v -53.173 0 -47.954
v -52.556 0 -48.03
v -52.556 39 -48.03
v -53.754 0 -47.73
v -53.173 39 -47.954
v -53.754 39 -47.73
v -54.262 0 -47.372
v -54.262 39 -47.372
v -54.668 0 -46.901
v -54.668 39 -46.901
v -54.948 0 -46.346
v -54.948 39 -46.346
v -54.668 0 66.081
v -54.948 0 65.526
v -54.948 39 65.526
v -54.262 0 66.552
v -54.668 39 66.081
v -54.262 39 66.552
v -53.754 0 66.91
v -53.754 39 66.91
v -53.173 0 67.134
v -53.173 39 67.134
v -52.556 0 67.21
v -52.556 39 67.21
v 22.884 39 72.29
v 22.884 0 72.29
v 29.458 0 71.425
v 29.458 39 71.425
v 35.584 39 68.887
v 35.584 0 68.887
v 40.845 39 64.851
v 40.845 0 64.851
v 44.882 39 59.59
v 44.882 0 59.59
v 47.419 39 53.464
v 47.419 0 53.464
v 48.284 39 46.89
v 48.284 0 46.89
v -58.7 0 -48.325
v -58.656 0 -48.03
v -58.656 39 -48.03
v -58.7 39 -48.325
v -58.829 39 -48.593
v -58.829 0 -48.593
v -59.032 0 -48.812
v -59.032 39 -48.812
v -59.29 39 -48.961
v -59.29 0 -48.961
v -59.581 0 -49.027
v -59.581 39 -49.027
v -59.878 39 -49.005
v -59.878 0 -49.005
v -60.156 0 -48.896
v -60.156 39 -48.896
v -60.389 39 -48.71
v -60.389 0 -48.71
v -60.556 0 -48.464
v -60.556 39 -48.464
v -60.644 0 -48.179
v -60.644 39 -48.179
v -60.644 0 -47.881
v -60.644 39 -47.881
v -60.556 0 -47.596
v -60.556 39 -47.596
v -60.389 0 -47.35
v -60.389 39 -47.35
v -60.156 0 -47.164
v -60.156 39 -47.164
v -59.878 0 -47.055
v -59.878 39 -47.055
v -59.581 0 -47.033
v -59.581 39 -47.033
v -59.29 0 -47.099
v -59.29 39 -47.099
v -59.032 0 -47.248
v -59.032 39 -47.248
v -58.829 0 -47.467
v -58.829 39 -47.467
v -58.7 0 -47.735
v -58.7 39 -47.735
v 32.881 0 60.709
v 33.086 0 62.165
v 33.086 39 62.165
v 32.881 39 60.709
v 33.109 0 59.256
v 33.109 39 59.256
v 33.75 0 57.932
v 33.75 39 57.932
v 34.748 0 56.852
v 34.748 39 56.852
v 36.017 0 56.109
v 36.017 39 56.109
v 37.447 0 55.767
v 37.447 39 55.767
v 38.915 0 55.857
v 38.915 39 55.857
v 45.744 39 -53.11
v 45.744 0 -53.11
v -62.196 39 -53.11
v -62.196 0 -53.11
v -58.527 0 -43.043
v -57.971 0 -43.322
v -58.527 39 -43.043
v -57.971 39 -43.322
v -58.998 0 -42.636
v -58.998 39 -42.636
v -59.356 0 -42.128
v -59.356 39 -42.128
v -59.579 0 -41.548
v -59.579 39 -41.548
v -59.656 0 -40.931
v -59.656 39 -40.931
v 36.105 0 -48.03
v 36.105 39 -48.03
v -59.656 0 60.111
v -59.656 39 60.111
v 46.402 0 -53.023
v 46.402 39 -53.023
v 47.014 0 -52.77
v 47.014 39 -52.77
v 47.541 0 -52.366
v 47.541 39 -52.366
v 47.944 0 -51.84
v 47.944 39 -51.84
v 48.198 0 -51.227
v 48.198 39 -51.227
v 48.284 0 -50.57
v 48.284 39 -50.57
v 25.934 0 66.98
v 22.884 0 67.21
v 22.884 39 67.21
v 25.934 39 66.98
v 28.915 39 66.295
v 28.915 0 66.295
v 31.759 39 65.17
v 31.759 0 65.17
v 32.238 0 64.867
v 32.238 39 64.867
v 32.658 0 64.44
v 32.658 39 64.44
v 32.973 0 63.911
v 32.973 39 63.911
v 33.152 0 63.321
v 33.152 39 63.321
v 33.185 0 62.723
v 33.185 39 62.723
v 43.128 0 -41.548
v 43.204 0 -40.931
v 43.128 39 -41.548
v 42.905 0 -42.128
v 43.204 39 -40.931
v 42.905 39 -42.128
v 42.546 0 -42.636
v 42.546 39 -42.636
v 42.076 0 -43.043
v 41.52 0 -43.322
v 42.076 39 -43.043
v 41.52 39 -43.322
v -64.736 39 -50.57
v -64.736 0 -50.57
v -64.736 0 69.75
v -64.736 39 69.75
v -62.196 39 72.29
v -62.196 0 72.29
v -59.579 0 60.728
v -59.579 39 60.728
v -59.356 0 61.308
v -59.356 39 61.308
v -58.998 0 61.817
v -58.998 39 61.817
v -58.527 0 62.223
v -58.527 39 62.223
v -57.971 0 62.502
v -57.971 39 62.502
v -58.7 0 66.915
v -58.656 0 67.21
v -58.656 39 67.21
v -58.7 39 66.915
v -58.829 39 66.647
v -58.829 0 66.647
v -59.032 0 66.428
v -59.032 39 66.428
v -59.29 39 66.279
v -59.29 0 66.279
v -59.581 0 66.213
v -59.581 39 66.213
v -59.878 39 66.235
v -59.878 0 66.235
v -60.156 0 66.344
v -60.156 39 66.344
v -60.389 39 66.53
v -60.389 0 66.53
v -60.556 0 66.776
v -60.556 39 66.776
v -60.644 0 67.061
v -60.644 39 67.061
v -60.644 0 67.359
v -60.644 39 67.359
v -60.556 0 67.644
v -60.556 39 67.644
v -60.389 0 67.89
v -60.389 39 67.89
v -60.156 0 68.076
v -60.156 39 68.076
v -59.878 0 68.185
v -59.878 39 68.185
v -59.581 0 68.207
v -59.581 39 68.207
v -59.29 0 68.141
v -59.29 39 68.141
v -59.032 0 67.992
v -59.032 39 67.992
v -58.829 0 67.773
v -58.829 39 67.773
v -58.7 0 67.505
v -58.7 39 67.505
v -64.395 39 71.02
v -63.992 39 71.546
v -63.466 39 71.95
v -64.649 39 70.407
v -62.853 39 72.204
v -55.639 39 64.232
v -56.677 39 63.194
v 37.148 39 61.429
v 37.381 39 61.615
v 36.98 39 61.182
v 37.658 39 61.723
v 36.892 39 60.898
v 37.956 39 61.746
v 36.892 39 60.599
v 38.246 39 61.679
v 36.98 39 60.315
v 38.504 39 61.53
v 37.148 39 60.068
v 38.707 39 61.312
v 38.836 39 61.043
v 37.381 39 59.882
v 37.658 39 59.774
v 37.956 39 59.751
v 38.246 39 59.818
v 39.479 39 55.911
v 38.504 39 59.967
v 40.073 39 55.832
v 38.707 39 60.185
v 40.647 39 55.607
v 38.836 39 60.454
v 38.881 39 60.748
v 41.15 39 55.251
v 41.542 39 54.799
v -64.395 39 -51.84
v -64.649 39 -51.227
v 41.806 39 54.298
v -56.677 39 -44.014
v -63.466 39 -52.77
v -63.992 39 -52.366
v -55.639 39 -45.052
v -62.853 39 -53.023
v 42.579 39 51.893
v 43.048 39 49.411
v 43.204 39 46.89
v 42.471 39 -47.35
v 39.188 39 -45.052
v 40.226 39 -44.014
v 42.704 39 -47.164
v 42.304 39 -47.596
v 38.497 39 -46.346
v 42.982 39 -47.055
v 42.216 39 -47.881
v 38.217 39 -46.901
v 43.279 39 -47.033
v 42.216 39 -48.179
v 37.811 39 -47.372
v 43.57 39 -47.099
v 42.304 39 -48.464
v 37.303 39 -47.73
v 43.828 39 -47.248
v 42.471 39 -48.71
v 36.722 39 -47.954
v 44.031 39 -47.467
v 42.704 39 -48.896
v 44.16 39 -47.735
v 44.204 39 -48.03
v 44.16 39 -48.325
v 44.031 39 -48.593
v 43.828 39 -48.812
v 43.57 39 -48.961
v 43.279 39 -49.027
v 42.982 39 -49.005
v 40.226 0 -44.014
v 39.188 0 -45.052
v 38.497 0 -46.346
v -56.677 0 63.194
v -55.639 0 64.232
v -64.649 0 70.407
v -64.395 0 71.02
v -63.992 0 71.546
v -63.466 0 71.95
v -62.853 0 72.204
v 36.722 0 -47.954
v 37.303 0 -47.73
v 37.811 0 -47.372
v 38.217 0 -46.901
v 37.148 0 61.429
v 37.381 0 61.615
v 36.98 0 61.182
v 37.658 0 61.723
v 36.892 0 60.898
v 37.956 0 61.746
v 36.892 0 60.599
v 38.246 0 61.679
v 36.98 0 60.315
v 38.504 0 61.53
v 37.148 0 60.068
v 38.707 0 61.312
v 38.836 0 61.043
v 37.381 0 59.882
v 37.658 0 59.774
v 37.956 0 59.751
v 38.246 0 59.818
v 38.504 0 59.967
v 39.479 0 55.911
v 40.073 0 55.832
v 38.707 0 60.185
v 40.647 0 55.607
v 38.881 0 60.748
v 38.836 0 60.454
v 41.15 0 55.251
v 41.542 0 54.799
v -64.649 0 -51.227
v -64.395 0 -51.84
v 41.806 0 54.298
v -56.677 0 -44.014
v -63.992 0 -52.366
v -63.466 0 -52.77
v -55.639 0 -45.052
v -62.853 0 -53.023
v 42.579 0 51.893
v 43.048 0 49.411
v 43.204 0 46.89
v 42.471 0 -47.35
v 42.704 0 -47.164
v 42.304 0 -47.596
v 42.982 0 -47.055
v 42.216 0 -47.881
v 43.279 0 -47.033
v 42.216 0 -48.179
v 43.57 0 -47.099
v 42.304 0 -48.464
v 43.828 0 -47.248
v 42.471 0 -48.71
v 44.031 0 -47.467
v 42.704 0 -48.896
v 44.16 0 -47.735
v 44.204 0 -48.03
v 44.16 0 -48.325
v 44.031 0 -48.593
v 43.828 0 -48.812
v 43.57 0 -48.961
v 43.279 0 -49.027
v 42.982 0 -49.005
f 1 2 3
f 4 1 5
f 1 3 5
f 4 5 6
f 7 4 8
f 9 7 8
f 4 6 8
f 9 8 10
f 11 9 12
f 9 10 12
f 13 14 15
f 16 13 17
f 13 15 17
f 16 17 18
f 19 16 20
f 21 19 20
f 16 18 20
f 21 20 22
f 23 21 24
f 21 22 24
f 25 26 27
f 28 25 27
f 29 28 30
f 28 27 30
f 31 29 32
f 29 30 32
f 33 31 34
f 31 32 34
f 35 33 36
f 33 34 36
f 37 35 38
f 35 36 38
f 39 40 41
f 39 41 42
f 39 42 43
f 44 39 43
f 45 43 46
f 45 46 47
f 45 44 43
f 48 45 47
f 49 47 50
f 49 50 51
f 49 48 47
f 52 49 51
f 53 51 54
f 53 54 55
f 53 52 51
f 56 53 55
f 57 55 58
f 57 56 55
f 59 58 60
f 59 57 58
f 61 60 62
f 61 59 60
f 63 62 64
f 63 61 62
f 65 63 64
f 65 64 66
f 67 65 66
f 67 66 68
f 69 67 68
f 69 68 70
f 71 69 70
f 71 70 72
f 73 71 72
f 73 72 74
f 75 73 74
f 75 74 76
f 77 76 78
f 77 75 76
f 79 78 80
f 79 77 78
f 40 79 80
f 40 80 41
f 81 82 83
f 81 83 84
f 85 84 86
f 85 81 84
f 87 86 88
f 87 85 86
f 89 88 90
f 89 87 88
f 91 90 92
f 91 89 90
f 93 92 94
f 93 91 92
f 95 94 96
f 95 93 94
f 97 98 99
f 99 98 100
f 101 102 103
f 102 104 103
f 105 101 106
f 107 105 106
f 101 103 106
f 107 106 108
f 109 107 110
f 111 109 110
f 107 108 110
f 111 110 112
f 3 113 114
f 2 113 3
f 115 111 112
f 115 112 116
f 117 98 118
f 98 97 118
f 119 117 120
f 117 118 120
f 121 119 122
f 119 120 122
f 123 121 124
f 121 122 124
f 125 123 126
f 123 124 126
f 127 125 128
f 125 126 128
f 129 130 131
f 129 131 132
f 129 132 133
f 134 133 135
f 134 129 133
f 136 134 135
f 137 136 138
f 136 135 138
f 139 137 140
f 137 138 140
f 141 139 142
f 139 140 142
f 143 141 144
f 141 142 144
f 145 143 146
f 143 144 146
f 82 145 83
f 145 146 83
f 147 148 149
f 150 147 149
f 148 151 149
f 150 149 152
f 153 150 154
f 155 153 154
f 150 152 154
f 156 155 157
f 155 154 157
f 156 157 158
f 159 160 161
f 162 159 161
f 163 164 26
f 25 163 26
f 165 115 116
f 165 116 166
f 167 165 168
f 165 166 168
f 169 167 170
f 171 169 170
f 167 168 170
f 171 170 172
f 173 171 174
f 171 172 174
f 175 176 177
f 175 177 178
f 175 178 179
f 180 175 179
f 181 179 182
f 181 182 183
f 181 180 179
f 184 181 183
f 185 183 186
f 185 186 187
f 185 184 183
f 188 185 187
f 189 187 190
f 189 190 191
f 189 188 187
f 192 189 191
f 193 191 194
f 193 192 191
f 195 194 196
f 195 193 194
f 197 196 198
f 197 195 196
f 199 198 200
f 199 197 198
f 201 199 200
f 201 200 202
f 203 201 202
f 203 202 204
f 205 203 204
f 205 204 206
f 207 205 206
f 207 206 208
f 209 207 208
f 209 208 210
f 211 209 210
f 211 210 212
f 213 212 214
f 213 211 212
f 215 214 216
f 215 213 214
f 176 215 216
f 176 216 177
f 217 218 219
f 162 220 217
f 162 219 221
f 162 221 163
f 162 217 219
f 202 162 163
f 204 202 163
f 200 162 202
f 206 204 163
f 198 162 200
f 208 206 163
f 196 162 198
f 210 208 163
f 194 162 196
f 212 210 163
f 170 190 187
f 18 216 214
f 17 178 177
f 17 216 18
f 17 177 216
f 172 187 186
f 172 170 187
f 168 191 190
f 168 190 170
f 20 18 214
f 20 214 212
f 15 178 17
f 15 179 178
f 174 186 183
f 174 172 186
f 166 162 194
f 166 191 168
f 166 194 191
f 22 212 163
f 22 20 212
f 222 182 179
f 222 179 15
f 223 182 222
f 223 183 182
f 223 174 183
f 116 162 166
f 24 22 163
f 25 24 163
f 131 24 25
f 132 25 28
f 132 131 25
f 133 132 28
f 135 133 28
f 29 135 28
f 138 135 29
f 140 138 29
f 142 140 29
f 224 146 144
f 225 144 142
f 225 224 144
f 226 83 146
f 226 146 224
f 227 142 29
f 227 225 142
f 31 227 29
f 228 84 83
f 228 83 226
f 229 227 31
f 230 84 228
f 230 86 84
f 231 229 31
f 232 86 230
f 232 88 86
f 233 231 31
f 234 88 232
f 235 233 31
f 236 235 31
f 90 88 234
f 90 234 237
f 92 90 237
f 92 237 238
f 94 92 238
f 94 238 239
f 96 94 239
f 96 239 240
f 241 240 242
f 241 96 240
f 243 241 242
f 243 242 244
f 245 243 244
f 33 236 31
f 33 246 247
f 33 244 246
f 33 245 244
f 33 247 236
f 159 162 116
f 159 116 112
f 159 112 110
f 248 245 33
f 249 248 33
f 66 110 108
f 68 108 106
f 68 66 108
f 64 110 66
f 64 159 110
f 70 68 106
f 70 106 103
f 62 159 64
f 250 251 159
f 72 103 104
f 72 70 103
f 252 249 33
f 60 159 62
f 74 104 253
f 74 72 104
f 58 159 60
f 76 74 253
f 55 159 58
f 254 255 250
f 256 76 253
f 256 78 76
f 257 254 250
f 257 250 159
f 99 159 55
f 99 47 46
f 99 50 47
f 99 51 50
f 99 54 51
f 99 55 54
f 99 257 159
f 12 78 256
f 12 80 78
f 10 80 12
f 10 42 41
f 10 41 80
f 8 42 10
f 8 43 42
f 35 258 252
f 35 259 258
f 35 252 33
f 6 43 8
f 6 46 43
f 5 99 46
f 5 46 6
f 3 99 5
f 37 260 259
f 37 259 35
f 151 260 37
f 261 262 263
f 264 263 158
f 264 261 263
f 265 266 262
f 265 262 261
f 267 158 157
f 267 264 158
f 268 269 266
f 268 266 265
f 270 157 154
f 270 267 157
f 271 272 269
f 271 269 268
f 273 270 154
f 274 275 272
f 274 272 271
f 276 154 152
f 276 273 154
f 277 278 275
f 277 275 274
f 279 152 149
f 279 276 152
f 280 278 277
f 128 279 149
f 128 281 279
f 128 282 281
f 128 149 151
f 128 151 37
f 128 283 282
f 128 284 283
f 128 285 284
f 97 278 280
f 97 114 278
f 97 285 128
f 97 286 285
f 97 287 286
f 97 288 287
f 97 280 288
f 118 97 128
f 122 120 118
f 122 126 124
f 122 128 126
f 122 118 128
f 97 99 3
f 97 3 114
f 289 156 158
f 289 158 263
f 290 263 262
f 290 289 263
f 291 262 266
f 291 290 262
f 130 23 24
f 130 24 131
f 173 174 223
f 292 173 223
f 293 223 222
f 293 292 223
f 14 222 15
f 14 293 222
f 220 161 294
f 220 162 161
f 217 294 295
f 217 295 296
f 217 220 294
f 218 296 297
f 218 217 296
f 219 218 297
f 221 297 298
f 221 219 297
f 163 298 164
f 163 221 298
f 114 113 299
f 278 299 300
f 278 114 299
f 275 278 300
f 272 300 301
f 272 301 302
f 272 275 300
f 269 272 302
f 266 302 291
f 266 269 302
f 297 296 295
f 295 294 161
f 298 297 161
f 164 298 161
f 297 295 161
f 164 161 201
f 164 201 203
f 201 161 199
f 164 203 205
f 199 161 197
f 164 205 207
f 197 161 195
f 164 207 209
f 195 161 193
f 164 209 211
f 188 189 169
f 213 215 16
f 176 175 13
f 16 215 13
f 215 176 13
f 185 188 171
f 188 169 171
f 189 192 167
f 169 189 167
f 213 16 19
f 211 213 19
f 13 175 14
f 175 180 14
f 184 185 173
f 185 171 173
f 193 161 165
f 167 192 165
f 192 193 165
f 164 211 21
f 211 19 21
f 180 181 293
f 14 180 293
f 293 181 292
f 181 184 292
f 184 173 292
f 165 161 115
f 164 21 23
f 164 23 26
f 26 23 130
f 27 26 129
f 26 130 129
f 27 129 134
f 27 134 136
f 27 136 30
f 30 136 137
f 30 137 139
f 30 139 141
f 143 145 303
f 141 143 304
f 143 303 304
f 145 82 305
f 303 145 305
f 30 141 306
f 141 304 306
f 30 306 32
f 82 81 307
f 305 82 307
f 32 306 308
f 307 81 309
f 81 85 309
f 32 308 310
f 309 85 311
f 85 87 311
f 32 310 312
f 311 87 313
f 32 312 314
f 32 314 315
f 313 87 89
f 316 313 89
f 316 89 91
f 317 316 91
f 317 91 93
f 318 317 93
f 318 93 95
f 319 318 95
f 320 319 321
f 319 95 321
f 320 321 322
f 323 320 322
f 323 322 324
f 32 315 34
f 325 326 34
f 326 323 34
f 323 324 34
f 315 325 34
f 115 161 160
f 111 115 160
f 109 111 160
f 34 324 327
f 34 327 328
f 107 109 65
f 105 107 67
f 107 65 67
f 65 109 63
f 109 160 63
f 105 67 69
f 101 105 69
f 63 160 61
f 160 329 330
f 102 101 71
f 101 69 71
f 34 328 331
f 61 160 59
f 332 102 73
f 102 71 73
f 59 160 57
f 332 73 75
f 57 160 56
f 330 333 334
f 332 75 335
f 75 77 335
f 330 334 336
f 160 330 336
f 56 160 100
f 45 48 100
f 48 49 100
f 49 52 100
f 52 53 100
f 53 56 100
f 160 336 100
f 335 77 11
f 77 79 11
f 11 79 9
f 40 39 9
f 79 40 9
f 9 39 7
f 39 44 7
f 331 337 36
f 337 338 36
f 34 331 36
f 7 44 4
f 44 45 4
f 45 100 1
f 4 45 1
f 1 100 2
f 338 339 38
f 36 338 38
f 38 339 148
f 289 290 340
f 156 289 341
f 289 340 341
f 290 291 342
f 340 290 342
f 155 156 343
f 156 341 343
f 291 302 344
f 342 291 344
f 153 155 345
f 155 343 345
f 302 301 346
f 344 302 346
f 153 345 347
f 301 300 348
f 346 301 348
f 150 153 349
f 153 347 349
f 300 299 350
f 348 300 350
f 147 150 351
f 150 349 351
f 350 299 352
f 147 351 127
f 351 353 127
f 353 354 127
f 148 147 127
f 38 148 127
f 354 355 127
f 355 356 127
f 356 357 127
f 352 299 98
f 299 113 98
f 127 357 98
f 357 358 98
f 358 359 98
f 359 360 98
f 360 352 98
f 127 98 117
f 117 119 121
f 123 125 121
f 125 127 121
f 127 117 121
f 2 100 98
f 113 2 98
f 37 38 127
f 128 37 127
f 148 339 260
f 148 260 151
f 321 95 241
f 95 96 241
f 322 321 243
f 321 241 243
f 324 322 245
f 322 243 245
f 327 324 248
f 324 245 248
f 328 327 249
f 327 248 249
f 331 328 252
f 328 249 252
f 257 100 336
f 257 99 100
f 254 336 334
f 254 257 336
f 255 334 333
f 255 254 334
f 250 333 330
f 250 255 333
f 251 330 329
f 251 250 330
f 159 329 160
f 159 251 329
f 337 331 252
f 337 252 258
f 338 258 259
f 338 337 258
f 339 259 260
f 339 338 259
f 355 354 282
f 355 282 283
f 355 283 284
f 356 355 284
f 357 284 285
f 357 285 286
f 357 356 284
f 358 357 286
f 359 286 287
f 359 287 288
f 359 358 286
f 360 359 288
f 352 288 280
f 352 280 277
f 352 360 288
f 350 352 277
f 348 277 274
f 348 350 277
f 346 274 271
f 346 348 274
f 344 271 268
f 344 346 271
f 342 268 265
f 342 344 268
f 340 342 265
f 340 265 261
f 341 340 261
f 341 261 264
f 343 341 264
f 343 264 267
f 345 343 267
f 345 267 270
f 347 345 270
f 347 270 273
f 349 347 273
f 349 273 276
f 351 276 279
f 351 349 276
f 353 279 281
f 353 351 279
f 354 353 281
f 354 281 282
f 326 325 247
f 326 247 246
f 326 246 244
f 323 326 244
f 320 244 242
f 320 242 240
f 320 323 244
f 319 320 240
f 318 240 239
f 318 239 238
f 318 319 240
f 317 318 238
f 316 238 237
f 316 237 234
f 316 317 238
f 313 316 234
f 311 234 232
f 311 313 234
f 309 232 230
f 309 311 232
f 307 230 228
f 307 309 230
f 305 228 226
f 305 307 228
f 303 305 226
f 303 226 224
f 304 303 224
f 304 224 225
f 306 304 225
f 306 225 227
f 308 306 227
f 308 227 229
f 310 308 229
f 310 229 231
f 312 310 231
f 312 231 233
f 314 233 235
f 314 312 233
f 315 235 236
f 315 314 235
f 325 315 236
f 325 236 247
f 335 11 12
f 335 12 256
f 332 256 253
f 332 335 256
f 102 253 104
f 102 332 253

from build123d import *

# Parameters (mm, degrees)
SKETCH1_R           = 1
BOSS_EXTRUDE3_DEPTH = 39
FILLET1_R           = 2.54


with BuildPart() as part:
    # Sketch1 → Boss-Extrude3 (new body)
    with BuildSketch(Plane(origin=(0, 0, 0), x_dir=(1, 0, 0), z_dir=(0, 1, 0))):
        with BuildLine():
            Line((48.284490735, 53.109977813), (-64.735509285, 53.109977813))
            Line((-64.735509285, 53.109977813), (-64.735509285, -72.290076187))
            Line((-64.735509285, -72.290076187), (22.884490735, -72.290076187))
            ThreePointArc((22.884490735, -72.290076187), (40.845002977, -64.850588429), (48.284490735, -46.890076187))
            Line((48.284490735, -46.890076187), (48.284490735, 53.109977813))
        make_face()
        with Locations((-59.655509285, 48.029977813)):
            Circle(SKETCH1_R, mode=Mode.SUBTRACT)
        with Locations((43.204490735, 48.029977813)):
            Circle(SKETCH1_R, mode=Mode.SUBTRACT)
        with Locations((-59.655509285, -67.210076187)):
            Circle(SKETCH1_R, mode=Mode.SUBTRACT)
        with Locations((37.880892571, -60.748479124)):
            Circle(SKETCH1_R, mode=Mode.SUBTRACT)
        with BuildLine():
            Line((38.204490735, 48.029977813), (-54.655509285, 48.029977813))
            ThreePointArc((-54.655509285, 48.029977813), (-56.119975379, 44.494443907), (-59.655509285, 43.029977813))
            Line((-59.655509285, 43.029977813), (-59.655509285, -62.210076187))
            ThreePointArc((-59.655509285, -62.210076187), (-56.119975379, -63.674542281), (-54.655509285, -67.210076187))
            Line((-54.655509285, -67.210076187), (22.884490735, -67.210076187))
            ThreePointArc((22.884490735, -67.210076187), (28.683169352, -66.365130135), (33.999606769, -63.900561058))
            ThreePointArc((33.999606769, -63.900561058), (34.208776178, -57.355020535), (40.717513048, -56.63100608))
            ThreePointArc((40.717513048, -56.63100608), (42.572931676, -51.916774238), (43.204490735, -46.890076187))
            Line((43.204490735, -46.890076187), (43.204490735, 43.029977813))
            ThreePointArc((43.204490735, 43.029977813), (39.668956829, 44.494443907), (38.204490735, 48.029977813))
        make_face(mode=Mode.SUBTRACT)
    extrude(amount=BOSS_EXTRUDE3_DEPTH)

    # Fillet1
    fillet1_edges = [part.edges().sort_by_distance(p)[0] for p in [
        (33.999606769, 19.5, 63.900561058),
        (40.717513048, 19.5, 56.63100608),
        (43.204490735, 19.5, -43.029977813),
        (38.204490735, 19.5, -48.029977813),
        (-54.655509285, 19.5, -48.029977813),
        (-59.655509285, 19.5, -43.029977813),
        (-59.655509285, 19.5, 62.210076187),
        (-54.655509285, 19.5, 67.210076187),
        (-64.735509285, 19.5, 72.290076187),
        (-64.735509285, 19.5, -53.109977813),
        (48.284490735, 19.5, -53.109977813),
    ]]
    fillet(fillet1_edges, radius=FILLET1_R)


solid = part.part
